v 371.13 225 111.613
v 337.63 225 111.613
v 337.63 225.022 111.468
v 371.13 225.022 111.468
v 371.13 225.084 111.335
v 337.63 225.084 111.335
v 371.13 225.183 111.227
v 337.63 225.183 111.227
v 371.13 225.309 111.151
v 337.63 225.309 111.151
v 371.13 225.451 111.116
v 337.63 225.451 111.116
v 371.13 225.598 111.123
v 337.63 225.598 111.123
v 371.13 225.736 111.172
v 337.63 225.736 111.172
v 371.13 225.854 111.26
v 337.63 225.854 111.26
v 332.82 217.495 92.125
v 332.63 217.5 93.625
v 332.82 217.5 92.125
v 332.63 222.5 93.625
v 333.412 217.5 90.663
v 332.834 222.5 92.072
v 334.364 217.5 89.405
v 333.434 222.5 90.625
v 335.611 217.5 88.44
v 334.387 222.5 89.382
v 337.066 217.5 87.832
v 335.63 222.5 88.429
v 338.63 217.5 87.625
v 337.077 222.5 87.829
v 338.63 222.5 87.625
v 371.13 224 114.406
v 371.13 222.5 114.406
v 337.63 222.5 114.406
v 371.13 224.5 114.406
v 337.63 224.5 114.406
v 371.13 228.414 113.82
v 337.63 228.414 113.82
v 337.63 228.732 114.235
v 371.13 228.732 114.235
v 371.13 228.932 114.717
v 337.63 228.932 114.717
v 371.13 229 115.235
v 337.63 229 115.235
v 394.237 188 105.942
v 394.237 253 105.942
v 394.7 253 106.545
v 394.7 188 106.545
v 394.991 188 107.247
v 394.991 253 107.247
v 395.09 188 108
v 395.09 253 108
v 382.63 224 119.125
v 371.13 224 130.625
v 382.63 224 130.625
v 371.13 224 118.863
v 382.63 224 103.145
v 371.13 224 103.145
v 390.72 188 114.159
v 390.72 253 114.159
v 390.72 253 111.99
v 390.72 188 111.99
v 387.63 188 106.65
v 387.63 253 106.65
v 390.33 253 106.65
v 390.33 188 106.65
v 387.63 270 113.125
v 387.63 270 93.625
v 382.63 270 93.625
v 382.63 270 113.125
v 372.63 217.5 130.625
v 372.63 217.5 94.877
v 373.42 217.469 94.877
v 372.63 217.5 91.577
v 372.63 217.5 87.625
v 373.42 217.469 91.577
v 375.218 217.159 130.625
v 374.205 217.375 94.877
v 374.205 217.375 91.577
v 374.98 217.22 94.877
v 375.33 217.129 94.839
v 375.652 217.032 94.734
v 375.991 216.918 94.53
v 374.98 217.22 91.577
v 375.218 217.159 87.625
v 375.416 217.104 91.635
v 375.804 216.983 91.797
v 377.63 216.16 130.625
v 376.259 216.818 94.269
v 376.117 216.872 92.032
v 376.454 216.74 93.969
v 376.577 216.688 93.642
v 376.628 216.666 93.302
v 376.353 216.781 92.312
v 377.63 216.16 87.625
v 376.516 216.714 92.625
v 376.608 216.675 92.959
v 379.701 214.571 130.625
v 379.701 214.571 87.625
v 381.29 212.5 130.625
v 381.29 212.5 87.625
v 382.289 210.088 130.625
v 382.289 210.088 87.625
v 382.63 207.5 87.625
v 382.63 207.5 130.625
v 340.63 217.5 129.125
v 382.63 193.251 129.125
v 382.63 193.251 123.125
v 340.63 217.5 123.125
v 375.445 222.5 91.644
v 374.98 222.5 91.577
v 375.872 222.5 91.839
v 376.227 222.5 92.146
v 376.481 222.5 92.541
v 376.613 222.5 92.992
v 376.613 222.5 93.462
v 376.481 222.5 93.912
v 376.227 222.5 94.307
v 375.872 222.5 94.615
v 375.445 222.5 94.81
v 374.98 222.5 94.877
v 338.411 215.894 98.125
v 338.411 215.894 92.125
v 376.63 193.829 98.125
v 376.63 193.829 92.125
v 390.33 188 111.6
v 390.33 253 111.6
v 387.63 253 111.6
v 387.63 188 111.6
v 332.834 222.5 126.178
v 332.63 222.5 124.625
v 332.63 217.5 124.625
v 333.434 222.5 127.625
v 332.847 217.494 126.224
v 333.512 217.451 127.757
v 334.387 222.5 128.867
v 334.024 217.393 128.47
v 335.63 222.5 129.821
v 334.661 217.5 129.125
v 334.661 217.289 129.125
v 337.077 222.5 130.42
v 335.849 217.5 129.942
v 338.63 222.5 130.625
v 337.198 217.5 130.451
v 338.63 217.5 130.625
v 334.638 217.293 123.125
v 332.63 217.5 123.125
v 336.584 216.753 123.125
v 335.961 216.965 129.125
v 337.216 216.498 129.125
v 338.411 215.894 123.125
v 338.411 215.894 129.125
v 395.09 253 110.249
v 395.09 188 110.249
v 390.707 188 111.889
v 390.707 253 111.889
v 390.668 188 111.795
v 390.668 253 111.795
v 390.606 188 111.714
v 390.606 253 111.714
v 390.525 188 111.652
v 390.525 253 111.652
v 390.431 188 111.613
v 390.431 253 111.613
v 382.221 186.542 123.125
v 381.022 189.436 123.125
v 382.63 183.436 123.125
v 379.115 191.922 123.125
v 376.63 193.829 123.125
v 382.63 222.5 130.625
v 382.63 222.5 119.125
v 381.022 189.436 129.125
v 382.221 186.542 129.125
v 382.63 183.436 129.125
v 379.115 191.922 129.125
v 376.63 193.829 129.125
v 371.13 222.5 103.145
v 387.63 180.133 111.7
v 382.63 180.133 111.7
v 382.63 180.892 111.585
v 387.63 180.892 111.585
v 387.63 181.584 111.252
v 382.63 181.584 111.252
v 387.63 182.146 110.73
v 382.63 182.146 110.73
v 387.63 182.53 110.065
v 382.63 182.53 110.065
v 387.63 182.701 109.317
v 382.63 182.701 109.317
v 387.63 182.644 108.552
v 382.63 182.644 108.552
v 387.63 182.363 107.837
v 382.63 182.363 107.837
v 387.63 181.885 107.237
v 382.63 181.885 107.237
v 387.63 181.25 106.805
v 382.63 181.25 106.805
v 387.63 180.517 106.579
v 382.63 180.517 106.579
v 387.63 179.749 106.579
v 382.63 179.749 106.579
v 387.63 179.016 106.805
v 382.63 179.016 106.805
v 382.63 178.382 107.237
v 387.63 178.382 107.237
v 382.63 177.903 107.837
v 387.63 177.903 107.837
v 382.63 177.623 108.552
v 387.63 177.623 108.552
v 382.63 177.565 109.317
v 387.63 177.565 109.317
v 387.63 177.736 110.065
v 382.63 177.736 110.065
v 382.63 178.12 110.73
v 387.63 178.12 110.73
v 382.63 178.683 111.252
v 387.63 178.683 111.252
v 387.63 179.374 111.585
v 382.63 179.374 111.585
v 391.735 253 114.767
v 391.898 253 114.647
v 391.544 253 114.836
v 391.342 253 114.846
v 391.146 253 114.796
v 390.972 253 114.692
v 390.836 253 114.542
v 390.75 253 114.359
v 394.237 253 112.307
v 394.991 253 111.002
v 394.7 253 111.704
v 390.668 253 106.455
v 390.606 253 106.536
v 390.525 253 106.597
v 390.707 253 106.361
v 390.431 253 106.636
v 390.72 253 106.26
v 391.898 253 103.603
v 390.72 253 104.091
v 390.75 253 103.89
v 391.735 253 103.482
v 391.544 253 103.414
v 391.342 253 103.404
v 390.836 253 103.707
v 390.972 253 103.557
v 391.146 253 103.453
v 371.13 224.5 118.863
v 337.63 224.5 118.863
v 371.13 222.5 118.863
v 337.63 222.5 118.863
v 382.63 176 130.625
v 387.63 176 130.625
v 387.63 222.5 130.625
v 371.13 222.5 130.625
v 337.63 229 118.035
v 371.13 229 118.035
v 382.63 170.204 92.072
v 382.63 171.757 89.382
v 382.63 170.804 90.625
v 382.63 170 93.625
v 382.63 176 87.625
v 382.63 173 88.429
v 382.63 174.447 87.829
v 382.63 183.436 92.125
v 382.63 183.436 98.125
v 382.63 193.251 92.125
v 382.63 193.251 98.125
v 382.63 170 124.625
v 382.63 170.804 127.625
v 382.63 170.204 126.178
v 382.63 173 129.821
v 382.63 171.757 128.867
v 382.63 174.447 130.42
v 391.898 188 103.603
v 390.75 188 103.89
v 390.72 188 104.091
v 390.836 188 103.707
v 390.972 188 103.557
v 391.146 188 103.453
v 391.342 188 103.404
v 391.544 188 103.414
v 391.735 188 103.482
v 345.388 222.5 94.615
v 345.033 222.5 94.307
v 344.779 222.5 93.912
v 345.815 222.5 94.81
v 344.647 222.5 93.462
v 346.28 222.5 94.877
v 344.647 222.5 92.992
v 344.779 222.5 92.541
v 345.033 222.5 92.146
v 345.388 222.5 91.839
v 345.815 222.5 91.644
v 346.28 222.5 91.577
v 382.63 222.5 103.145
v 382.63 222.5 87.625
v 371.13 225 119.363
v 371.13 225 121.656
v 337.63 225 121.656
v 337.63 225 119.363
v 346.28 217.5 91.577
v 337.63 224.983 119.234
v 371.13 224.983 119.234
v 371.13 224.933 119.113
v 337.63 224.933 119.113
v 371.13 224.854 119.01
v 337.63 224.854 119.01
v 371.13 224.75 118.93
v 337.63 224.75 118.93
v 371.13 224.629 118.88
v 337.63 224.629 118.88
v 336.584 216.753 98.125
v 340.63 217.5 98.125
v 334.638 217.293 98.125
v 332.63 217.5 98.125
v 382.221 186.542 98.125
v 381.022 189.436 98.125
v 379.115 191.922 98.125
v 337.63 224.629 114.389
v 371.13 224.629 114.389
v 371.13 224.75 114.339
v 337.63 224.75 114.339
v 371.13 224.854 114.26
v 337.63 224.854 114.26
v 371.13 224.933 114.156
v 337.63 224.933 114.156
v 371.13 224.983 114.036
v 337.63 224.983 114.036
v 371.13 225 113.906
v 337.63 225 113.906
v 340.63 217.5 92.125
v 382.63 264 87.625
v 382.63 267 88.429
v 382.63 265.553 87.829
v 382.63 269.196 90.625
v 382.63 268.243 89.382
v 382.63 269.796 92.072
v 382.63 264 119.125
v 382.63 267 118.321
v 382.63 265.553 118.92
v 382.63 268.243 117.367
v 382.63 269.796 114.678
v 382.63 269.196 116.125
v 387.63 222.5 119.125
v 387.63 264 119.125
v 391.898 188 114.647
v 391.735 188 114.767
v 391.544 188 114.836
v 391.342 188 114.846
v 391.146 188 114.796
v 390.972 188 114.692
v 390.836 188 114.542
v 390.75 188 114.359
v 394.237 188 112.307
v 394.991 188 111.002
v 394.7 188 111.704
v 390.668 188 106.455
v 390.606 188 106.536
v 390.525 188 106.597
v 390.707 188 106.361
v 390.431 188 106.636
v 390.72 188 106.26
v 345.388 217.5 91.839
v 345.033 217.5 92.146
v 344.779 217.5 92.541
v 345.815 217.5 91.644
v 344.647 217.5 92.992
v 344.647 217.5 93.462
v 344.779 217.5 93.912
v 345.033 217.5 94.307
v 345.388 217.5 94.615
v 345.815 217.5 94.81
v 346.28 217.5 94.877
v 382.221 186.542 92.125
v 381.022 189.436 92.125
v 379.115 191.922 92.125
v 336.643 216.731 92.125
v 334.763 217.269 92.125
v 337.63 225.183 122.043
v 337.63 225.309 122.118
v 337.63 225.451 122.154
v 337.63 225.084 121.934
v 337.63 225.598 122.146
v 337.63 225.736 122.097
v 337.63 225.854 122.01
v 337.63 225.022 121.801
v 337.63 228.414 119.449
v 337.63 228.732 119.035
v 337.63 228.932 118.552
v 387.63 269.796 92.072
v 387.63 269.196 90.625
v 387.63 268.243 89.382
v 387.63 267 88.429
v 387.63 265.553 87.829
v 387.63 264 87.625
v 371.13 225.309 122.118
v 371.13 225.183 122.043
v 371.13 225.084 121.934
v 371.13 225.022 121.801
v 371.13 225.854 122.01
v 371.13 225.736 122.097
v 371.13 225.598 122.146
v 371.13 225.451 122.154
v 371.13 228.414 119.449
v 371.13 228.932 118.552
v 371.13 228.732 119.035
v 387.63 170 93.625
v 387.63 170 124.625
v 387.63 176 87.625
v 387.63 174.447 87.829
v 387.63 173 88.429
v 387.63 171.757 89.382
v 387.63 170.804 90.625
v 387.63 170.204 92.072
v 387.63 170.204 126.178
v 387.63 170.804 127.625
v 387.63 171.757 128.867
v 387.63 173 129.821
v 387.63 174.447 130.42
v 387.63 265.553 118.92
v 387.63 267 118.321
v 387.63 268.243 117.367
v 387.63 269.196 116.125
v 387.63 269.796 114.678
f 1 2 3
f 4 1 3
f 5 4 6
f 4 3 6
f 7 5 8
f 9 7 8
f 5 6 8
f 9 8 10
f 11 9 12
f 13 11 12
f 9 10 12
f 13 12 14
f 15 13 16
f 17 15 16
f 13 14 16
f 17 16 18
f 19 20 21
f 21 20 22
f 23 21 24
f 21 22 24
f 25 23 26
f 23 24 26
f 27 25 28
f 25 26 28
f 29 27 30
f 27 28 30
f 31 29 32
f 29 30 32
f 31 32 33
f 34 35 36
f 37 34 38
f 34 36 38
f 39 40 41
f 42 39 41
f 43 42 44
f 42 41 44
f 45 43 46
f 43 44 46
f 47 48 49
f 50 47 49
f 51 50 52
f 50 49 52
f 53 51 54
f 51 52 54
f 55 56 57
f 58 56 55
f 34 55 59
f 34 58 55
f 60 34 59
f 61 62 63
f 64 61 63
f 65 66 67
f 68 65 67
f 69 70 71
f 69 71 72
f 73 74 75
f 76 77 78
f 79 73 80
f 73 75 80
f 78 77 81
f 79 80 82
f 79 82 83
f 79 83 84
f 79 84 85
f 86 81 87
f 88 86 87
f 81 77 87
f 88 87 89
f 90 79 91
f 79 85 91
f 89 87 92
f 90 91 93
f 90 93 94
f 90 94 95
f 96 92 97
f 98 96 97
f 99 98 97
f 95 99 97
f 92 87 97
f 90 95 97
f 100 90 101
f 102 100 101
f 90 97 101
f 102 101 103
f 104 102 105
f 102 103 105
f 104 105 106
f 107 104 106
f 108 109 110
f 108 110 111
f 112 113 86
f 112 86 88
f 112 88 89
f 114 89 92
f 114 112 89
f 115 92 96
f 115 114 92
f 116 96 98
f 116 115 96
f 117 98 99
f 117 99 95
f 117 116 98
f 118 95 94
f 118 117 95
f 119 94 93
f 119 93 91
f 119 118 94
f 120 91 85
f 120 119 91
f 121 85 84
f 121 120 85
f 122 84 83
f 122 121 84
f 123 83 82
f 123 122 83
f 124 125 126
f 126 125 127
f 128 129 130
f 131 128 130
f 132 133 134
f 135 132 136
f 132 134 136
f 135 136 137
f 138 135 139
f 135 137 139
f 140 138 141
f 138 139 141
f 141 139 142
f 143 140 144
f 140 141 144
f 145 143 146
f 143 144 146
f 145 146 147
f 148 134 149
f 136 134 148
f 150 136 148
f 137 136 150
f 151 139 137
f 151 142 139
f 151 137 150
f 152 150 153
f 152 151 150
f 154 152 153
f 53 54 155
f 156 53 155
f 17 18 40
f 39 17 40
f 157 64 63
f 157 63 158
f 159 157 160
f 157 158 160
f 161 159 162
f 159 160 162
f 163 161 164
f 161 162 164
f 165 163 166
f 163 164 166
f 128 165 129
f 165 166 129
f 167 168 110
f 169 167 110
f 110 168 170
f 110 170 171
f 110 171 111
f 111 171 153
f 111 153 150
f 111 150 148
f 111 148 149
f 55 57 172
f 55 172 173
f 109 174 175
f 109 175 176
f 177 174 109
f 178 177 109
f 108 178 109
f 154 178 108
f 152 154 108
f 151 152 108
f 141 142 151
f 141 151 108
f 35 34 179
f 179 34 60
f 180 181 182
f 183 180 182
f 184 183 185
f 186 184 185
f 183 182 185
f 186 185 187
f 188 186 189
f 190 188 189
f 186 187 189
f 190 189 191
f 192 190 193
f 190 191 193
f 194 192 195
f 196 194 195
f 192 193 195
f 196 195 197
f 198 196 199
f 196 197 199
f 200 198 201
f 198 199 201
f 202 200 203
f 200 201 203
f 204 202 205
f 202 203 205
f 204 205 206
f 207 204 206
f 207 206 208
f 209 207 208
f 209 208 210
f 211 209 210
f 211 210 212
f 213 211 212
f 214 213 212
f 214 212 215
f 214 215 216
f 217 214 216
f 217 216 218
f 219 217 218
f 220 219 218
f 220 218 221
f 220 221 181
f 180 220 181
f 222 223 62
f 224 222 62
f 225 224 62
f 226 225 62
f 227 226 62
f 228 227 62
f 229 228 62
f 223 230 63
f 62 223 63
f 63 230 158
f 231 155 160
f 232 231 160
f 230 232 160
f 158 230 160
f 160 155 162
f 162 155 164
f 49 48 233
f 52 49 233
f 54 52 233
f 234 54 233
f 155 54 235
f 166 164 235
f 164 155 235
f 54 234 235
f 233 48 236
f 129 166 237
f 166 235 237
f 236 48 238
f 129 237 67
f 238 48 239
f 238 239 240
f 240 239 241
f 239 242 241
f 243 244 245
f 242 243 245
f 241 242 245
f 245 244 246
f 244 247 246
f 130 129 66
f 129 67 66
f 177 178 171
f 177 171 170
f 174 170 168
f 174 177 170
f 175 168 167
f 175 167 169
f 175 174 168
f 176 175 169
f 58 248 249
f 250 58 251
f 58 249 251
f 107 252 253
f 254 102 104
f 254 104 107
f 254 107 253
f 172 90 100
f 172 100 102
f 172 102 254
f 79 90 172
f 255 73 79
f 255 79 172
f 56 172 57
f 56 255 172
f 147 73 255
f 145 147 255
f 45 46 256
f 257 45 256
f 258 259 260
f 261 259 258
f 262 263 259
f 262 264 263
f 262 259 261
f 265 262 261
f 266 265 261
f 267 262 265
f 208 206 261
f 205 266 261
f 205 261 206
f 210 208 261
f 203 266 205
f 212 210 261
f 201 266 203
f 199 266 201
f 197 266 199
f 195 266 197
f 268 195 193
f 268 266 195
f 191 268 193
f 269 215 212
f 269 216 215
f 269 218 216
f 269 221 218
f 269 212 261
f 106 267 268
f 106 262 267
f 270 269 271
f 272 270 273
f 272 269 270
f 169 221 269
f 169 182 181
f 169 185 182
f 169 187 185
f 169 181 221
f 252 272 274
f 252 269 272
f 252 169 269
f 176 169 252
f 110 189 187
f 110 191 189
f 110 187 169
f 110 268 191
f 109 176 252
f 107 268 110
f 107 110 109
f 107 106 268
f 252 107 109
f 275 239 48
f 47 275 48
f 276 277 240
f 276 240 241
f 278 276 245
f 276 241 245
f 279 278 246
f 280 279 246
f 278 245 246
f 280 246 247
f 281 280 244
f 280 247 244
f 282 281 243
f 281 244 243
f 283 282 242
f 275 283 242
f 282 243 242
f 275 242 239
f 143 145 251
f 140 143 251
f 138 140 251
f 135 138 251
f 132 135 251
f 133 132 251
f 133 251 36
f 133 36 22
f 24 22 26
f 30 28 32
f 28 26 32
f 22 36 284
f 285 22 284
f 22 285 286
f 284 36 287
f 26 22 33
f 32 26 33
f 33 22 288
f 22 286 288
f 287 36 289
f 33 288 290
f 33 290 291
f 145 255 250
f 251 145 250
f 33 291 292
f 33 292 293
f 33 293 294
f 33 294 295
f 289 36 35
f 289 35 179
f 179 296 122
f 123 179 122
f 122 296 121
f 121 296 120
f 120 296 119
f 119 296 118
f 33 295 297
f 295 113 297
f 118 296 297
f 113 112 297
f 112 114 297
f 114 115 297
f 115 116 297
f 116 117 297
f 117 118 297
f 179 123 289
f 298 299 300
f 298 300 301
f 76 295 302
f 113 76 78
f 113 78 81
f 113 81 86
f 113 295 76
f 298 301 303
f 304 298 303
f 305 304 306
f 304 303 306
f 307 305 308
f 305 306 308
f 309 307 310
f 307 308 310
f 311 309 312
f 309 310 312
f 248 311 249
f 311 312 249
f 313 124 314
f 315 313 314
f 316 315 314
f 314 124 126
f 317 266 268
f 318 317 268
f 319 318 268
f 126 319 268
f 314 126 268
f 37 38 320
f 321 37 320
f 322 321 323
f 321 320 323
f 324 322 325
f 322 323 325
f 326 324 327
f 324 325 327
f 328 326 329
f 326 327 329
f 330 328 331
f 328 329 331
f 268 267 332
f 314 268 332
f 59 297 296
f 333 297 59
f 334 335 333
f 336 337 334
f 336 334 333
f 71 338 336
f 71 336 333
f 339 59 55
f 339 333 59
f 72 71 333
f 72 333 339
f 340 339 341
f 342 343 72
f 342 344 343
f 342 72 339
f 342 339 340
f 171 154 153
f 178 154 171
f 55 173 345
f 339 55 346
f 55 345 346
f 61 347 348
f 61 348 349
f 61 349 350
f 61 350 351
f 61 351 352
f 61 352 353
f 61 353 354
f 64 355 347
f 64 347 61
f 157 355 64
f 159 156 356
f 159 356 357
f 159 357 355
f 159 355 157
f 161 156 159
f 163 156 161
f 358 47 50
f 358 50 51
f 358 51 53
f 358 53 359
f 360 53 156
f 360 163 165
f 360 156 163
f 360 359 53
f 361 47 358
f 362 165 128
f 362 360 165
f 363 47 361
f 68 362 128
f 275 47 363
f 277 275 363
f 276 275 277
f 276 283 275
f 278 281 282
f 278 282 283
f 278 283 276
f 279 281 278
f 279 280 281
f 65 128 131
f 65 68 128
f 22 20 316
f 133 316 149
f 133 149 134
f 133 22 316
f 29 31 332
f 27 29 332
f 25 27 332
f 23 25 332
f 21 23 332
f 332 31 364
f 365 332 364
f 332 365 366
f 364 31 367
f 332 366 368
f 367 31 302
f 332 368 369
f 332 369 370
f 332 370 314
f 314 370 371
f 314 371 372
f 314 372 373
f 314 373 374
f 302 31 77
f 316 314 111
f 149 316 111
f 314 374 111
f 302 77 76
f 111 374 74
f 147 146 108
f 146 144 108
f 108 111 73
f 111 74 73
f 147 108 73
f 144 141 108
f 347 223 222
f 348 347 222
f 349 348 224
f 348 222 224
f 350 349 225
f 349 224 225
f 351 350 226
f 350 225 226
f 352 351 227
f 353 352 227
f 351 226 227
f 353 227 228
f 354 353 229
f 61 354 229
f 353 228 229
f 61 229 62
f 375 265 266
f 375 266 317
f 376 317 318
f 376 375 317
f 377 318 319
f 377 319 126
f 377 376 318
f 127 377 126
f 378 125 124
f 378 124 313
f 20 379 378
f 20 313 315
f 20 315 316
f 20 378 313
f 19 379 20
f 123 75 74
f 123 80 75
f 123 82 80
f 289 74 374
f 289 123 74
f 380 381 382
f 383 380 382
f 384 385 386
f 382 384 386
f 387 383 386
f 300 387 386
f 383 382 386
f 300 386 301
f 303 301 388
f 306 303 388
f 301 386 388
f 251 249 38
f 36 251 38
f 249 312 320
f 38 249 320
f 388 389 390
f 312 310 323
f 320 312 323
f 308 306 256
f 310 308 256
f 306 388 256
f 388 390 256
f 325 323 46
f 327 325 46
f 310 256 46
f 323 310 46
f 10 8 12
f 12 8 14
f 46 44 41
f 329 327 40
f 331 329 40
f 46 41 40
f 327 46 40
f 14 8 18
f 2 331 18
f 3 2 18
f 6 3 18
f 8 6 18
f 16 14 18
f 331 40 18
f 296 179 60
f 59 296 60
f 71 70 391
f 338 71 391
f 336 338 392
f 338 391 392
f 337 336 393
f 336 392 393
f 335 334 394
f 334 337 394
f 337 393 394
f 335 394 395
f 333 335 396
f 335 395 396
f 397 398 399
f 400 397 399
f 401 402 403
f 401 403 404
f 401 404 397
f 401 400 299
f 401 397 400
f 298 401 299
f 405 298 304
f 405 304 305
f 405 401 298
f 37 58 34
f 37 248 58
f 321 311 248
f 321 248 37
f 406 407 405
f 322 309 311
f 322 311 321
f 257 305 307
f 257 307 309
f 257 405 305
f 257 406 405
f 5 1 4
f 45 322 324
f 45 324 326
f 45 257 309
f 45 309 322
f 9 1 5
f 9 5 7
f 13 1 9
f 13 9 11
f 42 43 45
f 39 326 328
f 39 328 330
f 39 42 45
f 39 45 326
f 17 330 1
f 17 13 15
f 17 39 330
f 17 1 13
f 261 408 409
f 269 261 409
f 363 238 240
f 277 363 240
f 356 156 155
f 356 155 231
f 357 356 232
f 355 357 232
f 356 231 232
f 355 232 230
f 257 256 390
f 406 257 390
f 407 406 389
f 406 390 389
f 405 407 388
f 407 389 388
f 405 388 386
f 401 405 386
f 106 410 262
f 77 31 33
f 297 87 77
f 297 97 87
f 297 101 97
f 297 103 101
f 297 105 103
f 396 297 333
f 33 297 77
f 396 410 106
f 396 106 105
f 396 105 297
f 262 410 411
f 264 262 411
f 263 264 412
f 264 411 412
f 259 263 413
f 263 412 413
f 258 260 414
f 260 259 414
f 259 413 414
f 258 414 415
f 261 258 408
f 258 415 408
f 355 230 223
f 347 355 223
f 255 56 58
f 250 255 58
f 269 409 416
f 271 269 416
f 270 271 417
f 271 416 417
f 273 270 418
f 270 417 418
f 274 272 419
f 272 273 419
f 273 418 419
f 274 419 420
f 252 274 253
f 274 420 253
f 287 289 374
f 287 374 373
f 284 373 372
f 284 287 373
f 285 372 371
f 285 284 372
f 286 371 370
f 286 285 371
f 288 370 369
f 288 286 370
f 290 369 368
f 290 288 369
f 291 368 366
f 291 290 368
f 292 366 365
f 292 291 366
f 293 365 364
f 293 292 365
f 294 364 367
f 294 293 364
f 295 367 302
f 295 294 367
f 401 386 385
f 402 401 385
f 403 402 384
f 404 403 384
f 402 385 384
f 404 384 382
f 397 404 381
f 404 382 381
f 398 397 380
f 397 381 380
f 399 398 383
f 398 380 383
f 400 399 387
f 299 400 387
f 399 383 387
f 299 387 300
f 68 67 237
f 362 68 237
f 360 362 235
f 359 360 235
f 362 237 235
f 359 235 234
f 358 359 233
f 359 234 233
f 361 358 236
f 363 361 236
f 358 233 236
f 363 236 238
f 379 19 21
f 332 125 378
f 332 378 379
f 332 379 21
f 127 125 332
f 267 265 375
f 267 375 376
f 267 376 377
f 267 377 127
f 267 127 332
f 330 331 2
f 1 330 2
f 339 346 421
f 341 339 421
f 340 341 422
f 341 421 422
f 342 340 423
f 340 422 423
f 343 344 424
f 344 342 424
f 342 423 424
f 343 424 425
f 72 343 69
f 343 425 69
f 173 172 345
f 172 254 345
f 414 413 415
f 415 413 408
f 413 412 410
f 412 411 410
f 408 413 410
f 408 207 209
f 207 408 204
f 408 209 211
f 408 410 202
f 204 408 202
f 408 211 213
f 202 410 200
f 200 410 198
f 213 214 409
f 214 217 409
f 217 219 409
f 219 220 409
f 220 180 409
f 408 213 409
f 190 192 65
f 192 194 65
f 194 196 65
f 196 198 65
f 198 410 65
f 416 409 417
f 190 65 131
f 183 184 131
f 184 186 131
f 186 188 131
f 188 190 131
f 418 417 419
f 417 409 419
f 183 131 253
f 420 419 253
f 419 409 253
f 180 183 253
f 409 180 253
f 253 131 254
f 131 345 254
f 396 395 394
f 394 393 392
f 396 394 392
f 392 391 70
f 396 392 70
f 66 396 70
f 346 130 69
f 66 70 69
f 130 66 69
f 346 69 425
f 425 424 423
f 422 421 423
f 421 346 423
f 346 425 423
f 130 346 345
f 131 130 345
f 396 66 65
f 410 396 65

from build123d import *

# Parameters (mm, degrees)
BOSS_EXTRUDE5_DEPTH  = 50
SKETCH11_W           = 43
SKETCH11_H           = 100
BOSS_EXTRUDE6_DEPTH  = 5
BOSS_EXTRUDE8_DEPTH  = 55
SKETCH13_W           = 11.5
SKETCH13_H           = 47.5
CUT_EXTRUDE1_DEPTH   = 55
BOSS_EXTRUDE9_DEPTH  = 6
FILLET7_R            = 12
FILLET7_OF_MIRROR1_R = 12
FILLET8_R            = 6
BOSS_EXTRUDE10_START = 8
BOSS_EXTRUDE10_DEPTH = 8
FILLET12_R           = 10
BOSS_EXTRUDE11_DEPTH = 57
SKETCH16_R           = 2.575
CUT_EXTRUDE2_DEPTH   = 10
SKETCH17_W           = 27.480150942
SKETCH17_H           = 1.5
BOSS_EXTRUDE12_DEPTH = 11.5
BOSS_EXTRUDE15_START = -5
BOSS_EXTRUDE15_DEPTH = 33.5
CUT_EXTRUDE3_DEPTH   = 6


with BuildPart() as part:
    # Sketch9 → Boss-Extrude5 (new body)
    with BuildSketch(Plane(origin=(0, 245, 0), x_dir=(1, 0, 0), z_dir=(0, 1, 0))):
        with BuildLine():
            Line((389.629800237, -111.599739584), (387.629800237, -111.599739584))
            Line((387.629800237, -111.599739584), (387.629800237, -106.649739584))
            Line((387.629800237, -106.649739584), (389.629800237, -106.649739584))
            Line((389.629800237, -106.649739584), (390.329799474, -106.649739584))
            ThreePointArc((390.329799474, -106.649739584), (390.605571069, -106.535511279), (390.719799474, -106.259739725))
            Line((390.719799474, -106.259739725), (390.719800256, -104.090618139))
            ThreePointArc((390.719800256, -104.090618139), (391.145748802, -103.453141463), (391.897703935, -103.602714709))
            Line((391.897703935, -103.602714709), (394.237480965, -105.942491739))
            ThreePointArc((394.237480965, -105.942491739), (394.868289671, -106.886563682), (395.089800232, -108.000172467))
            Line((395.089800232, -108.000172467), (395.089800237, -110.249306685))
            ThreePointArc((395.089800237, -110.249306685), (394.868289678, -111.362915477), (394.23748097, -112.306987424))
            Line((394.23748097, -112.306987424), (391.897703941, -114.646764454))
            ThreePointArc((391.897703941, -114.646764454), (391.145748809, -114.7963377), (390.719800262, -114.158861025))
            Line((390.719800262, -114.158861025), (390.719799474, -111.989739443))
            ThreePointArc((390.719799474, -111.989739443), (390.605571069, -111.71396789), (390.329799474, -111.599739584))
            Line((390.329799474, -111.599739584), (389.629800237, -111.599739584))
        make_face()
    extrude(amount=-BOSS_EXTRUDE5_DEPTH)

    # Sketch11 → Boss-Extrude6 (add)
    with BuildSketch(Plane.ZY.offset(-387.629800242)):
        with Locations((109.124739584, 220)):
            Rectangle(SKETCH11_W, SKETCH11_H)
    extrude(amount=BOSS_EXTRUDE6_DEPTH)

    # Sketch12 → Boss-Extrude8 (add)
    with BuildSketch(Plane.ZY.offset(-387.629800242)):
        Polygon((130.624739584, 222.5), (89.124739584, 222.5), (87.624739584, 222.5), (87.624739584, 217.5), (89.124739584, 217.5), (130.624739584, 217.5), align=None)
    extrude(amount=BOSS_EXTRUDE8_DEPTH)

    # Sketch13 → Cut-Extrude1 (cut)
    with BuildSketch(Plane.ZY.offset(-387.629800242)):
        with Locations((124.874739584, 246.25)):
            Rectangle(SKETCH13_W, SKETCH13_H)
    extrude(amount=CUT_EXTRUDE1_DEPTH, mode=Mode.SUBTRACT)

    # Sketch15 → Boss-Extrude9 (add)
    with BuildSketch(Plane.XY.offset(129.124739584)):
        Polygon((335.629800242, 217.5), (382.629800242, 190.364537348), (382.629800242, 193.251288694), (340.629800242, 217.5), align=None)
    boss_extrude9 = extrude(amount=-BOSS_EXTRUDE9_DEPTH)

    # Fillet7
    # the kernel refuses this fillet: 12 mm, written as the material it adds along each edge
    with BuildSketch(Plane(origin=(335.629800242, 217.5, 129.124739584), x_dir=(-1, 0, 0), z_dir=(0, 0, -1))) as fillet7_piece_1:
        with BuildLine():
            CenterArc((3.218847051, -11.998004249), FILLET7_R, 91.044975628, 28.955024372)
            Line((-2.781152949, -1.605699404), (-2.901152949, -1.397853307))
            Line((-2.901152949, -1.397853307), (-0.12, 0.207846097))
            Line((-0.12, 0.207846097), (0, 0.24))
            ThreePointArc((0, 0.24), (1.5, 0.24), (2.995623059, 0.239960085))
            Line((2.995623059, 0.239960085), (3, 0))
        make_face()
    extrude(amount=6)
    with BuildSketch(Plane(origin=(382.629800242, 190.364537348, 129.124739584), x_dir=(0, -1, 0), z_dir=(0, 0, -1))) as fillet7_piece_2:
        with BuildLine():
            CenterArc((FILLET7_R * 0.57735026919, FILLET7_R), FILLET7_R, 210, 60)
            Line((-FILLET7_R * 0.288675134595, FILLET7_R * 0.5), (-FILLET7_R * 0.305995642671, FILLET7_R * 0.49))
            Line((-FILLET7_R * 0.305995642671, FILLET7_R * 0.49), (-FILLET7_R * 0.0115470053838, -FILLET7_R * 0.02))
            Line((-FILLET7_R * 0.0115470053838, -FILLET7_R * 0.02), (FILLET7_R * 0.57735026919, -FILLET7_R * 0.02))
            Line((FILLET7_R * 0.57735026919, -FILLET7_R * 0.02), (FILLET7_R * 0.57735026919, 0))
        make_face()
    extrude(amount=6)

    # Mirror1: Boss-Extrude9 across plane
    add(boss_extrude9.mirror(Plane.XY.offset(110.624739584)))

    # Fillet7 of Mirror1
    # the kernel refuses this fillet: 12 mm, written as the material it adds along each edge
    with BuildSketch(Plane(origin=(335.629800242, 217.5, 92.124739584), x_dir=(-1, 0, 0), z_dir=(0, 0, 1))) as fillet7_of_mirror1_piece_1:
        with BuildLine():
            CenterArc((3.218847051, 11.998004249), FILLET7_OF_MIRROR1_R, 240, 28.955024372)
            Line((-2.781152949, 1.605699404), (-2.901152949, 1.397853307))
            Line((-2.901152949, 1.397853307), (-0.12, -0.207846097))
            Line((-0.12, -0.207846097), (0, -0.24))
            ThreePointArc((0, -0.24), (1.5, -0.24), (2.995623059, -0.239960085))
            Line((2.995623059, -0.239960085), (3, 0))
        make_face()
    extrude(amount=6)
    with BuildSketch(Plane(origin=(382.629800242, 190.364537348, 92.124739584), x_dir=(0, -1, 0), z_dir=(0, 0, 1))) as fillet7_of_mirror1_piece_2:
        with BuildLine():
            CenterArc((FILLET7_OF_MIRROR1_R * 0.57735026919, -FILLET7_OF_MIRROR1_R), FILLET7_OF_MIRROR1_R, 90, 60)
            Line((-FILLET7_OF_MIRROR1_R * 0.288675134595, -FILLET7_OF_MIRROR1_R * 0.5), (-FILLET7_OF_MIRROR1_R * 0.305995642671, -FILLET7_OF_MIRROR1_R * 0.49))
            Line((-FILLET7_OF_MIRROR1_R * 0.305995642671, -FILLET7_OF_MIRROR1_R * 0.49), (-FILLET7_OF_MIRROR1_R * 0.0115470053838, FILLET7_OF_MIRROR1_R * 0.02))
            Line((-FILLET7_OF_MIRROR1_R * 0.0115470053838, FILLET7_OF_MIRROR1_R * 0.02), (FILLET7_OF_MIRROR1_R * 0.57735026919, FILLET7_OF_MIRROR1_R * 0.02))
            Line((FILLET7_OF_MIRROR1_R * 0.57735026919, FILLET7_OF_MIRROR1_R * 0.02), (FILLET7_OF_MIRROR1_R * 0.57735026919, 0))
        make_face()
    extrude(amount=6)

    # Fillet8
    # the kernel refuses this fillet: 6 mm, written as the material it takes off along each edge
    with BuildSketch(Plane(origin=(402.629800242, 270, 87.624739584), x_dir=(0, 0, 1), z_dir=(-1, 0, 0)), Plane(origin=(332.629800242, 237.5, 87.624739584), x_dir=(0, 0, 1), z_dir=(0, -1, 0)), Plane(origin=(402.629800242, 270, 119.124739584), x_dir=(0, -1, 0), z_dir=(-1, 0, 0))) as fillet8_piece_1:
        with BuildLine():
            CenterArc((FILLET8_R, -FILLET8_R), FILLET8_R, 90, 90)
            Line((0, -FILLET8_R), (0, 0))
            Line((0, 0), (FILLET8_R, 0))
        make_face()
    extrude(amount=35, mode=Mode.SUBTRACT)
    with BuildSketch(Plane(origin=(402.629800242, 170, 87.624739584), x_dir=(0, 0, 1), z_dir=(-1, 0, 0)), Plane(origin=(402.629800242, 170, 130.624739584), x_dir=(0, 1, 0), z_dir=(-1, 0, 0)), Plane(origin=(332.629800242, 202.5, 130.624739584), x_dir=(1, 0, 0), z_dir=(0, 1, 0))) as fillet8_piece_2:
        with BuildLine():
            CenterArc((FILLET8_R, FILLET8_R), FILLET8_R, 180, 90)
            Line((0, FILLET8_R), (0, 0))
            Line((0, 0), (FILLET8_R, 0))
        make_face()
    extrude(amount=35, mode=Mode.SUBTRACT)

    # Sketch9<2> → Boss-Extrude10 (add)
    with BuildSketch(Plane(origin=(0, 245, 0), x_dir=(1, 0, 0), z_dir=(0, 1, 0)).offset(BOSS_EXTRUDE10_START)):
        with BuildLine():
            Line((389.629800237, -111.599739584), (387.629800237, -111.599739584))
            Line((387.629800237, -111.599739584), (387.629800237, -106.649739584))
            Line((387.629800237, -106.649739584), (389.629800237, -106.649739584))
            Line((389.629800237, -106.649739584), (390.329799474, -106.649739584))
            ThreePointArc((390.329799474, -106.649739584), (390.605571069, -106.535511279), (390.719799474, -106.259739725))
            Line((390.719799474, -106.259739725), (390.719800256, -104.090618139))
            ThreePointArc((390.719800256, -104.090618139), (391.145748802, -103.453141463), (391.897703935, -103.602714709))
            Line((391.897703935, -103.602714709), (394.237480965, -105.942491739))
            ThreePointArc((394.237480965, -105.942491739), (394.868289671, -106.886563682), (395.089800232, -108.000172467))
            Line((395.089800232, -108.000172467), (395.089800237, -110.249306685))
            ThreePointArc((395.089800237, -110.249306685), (394.868289678, -111.362915477), (394.23748097, -112.306987424))
            Line((394.23748097, -112.306987424), (391.897703941, -114.646764454))
            ThreePointArc((391.897703941, -114.646764454), (391.145748809, -114.7963377), (390.719800262, -114.158861025))
            Line((390.719800262, -114.158861025), (390.719799474, -111.989739443))
            ThreePointArc((390.719799474, -111.989739443), (390.605571069, -111.71396789), (390.329799474, -111.599739584))
            Line((390.329799474, -111.599739584), (389.629800237, -111.599739584))
        make_face()
    extrude(amount=-BOSS_EXTRUDE10_DEPTH)

    # Fillet12
    fillet12_edges = [part.edges().sort_by_distance(p)[0] for p in [
        (382.629800242, 217.5, 109.124739584),
    ]]
    fillet(fillet12_edges, radius=FILLET12_R)

    # Sketch9<3> → Boss-Extrude11 (add)
    with BuildSketch(Plane(origin=(0, 245, 0), x_dir=(1, 0, 0), z_dir=(0, 1, 0))):
        with BuildLine():
            Line((389.629800237, -111.599739584), (387.629800237, -111.599739584))
            Line((387.629800237, -111.599739584), (387.629800237, -106.649739584))
            Line((387.629800237, -106.649739584), (389.629800237, -106.649739584))
            Line((389.629800237, -106.649739584), (390.329799474, -106.649739584))
            ThreePointArc((390.329799474, -106.649739584), (390.605571069, -106.535511279), (390.719799474, -106.259739725))
            Line((390.719799474, -106.259739725), (390.719800256, -104.090618139))
            ThreePointArc((390.719800256, -104.090618139), (391.145748802, -103.453141463), (391.897703935, -103.602714709))
            Line((391.897703935, -103.602714709), (394.237480965, -105.942491739))
            ThreePointArc((394.237480965, -105.942491739), (394.868289671, -106.886563682), (395.089800232, -108.000172467))
            Line((395.089800232, -108.000172467), (395.089800237, -110.249306685))
            ThreePointArc((395.089800237, -110.249306685), (394.868289678, -111.362915477), (394.23748097, -112.306987424))
            Line((394.23748097, -112.306987424), (391.897703941, -114.646764454))
            ThreePointArc((391.897703941, -114.646764454), (391.145748809, -114.7963377), (390.719800262, -114.158861025))
            Line((390.719800262, -114.158861025), (390.719799474, -111.989739443))
            ThreePointArc((390.719799474, -111.989739443), (390.605571069, -111.71396789), (390.329799474, -111.599739584))
            Line((390.329799474, -111.599739584), (389.629800237, -111.599739584))
        make_face()
    extrude(amount=-BOSS_EXTRUDE11_DEPTH)

    # Sketch16 → Cut-Extrude2 (cut)
    with BuildSketch(Plane.ZY.offset(-382.629800242)):
        with Locations((109.124739584, 180.133064736)):
            Circle(SKETCH16_R)
    extrude(amount=-CUT_EXTRUDE2_DEPTH, mode=Mode.SUBTRACT)

    # Sketch17 → Boss-Extrude12 (add)
    with BuildSketch(Plane(origin=(371.129800242, 0, 0), x_dir=(0, 0, -1), z_dir=(1, 0, 0))):
        with Locations((-116.884664113, 223.25)):
            Rectangle(SKETCH17_W, SKETCH17_H)
    extrude(amount=BOSS_EXTRUDE12_DEPTH)

    # Sketch22 → Boss-Extrude15 (add)
    with BuildSketch(Plane.ZY.offset(-332.629800242).offset(BOSS_EXTRUDE15_START)):
        with BuildLine():
            Line((114.406150208, 222.5), (114.406150208, 224.5))
            ThreePointArc((114.406150208, 224.5), (114.259703598, 224.853553391), (113.906150208, 225))
            Line((113.906150208, 225), (111.613256989, 225))
            ThreePointArc((111.613256989, 225), (111.151317223, 225.308658284), (111.259703598, 225.853553391))
            Line((111.259703598, 225.853553391), (113.82036377, 228.414213562))
            ThreePointArc((113.82036377, 228.414213562), (114.469210468, 228.847759065), (115.234577333, 229))
            Line((115.234577333, 229), (116.634664113, 229))
            Line((116.634664113, 229), (118.034750894, 229))
            ThreePointArc((118.034750894, 229), (118.800117758, 228.847759065), (119.448964456, 228.414213562))
            Line((119.448964456, 228.414213562), (122.009624628, 225.853553391))
            ThreePointArc((122.009624628, 225.853553391), (122.118011003, 225.308658284), (121.656071237, 225))
            Line((121.656071237, 225), (119.363178018, 225))
            ThreePointArc((119.363178018, 225), (119.009624628, 224.853553391), (118.863178018, 224.5))
            Line((118.863178018, 224.5), (118.863178018, 222.5))
            Line((118.863178018, 222.5), (114.406150208, 222.5))
        make_face()
    extrude(amount=-BOSS_EXTRUDE15_DEPTH)

    # Sketch23 → Cut-Extrude3 (cut)
    with BuildSketch(Plane(origin=(0, 222.5, 0), x_dir=(1, 0, 0), z_dir=(0, 1, 0))):
        with BuildLine():
            Line((346.279800242, -91.576720164), (374.979800242, -91.576720164))
            ThreePointArc((374.979800242, -91.576720164), (376.629800242, -93.226720164), (374.979800242, -94.876720164))
            Line((374.979800242, -94.876720164), (346.279800242, -94.876720164))
            ThreePointArc((346.279800242, -94.876720164), (344.629800242, -93.226720164), (346.279800242, -91.576720164))
        make_face()
    extrude(amount=-CUT_EXTRUDE3_DEPTH, mode=Mode.SUBTRACT)


solid = part.part
